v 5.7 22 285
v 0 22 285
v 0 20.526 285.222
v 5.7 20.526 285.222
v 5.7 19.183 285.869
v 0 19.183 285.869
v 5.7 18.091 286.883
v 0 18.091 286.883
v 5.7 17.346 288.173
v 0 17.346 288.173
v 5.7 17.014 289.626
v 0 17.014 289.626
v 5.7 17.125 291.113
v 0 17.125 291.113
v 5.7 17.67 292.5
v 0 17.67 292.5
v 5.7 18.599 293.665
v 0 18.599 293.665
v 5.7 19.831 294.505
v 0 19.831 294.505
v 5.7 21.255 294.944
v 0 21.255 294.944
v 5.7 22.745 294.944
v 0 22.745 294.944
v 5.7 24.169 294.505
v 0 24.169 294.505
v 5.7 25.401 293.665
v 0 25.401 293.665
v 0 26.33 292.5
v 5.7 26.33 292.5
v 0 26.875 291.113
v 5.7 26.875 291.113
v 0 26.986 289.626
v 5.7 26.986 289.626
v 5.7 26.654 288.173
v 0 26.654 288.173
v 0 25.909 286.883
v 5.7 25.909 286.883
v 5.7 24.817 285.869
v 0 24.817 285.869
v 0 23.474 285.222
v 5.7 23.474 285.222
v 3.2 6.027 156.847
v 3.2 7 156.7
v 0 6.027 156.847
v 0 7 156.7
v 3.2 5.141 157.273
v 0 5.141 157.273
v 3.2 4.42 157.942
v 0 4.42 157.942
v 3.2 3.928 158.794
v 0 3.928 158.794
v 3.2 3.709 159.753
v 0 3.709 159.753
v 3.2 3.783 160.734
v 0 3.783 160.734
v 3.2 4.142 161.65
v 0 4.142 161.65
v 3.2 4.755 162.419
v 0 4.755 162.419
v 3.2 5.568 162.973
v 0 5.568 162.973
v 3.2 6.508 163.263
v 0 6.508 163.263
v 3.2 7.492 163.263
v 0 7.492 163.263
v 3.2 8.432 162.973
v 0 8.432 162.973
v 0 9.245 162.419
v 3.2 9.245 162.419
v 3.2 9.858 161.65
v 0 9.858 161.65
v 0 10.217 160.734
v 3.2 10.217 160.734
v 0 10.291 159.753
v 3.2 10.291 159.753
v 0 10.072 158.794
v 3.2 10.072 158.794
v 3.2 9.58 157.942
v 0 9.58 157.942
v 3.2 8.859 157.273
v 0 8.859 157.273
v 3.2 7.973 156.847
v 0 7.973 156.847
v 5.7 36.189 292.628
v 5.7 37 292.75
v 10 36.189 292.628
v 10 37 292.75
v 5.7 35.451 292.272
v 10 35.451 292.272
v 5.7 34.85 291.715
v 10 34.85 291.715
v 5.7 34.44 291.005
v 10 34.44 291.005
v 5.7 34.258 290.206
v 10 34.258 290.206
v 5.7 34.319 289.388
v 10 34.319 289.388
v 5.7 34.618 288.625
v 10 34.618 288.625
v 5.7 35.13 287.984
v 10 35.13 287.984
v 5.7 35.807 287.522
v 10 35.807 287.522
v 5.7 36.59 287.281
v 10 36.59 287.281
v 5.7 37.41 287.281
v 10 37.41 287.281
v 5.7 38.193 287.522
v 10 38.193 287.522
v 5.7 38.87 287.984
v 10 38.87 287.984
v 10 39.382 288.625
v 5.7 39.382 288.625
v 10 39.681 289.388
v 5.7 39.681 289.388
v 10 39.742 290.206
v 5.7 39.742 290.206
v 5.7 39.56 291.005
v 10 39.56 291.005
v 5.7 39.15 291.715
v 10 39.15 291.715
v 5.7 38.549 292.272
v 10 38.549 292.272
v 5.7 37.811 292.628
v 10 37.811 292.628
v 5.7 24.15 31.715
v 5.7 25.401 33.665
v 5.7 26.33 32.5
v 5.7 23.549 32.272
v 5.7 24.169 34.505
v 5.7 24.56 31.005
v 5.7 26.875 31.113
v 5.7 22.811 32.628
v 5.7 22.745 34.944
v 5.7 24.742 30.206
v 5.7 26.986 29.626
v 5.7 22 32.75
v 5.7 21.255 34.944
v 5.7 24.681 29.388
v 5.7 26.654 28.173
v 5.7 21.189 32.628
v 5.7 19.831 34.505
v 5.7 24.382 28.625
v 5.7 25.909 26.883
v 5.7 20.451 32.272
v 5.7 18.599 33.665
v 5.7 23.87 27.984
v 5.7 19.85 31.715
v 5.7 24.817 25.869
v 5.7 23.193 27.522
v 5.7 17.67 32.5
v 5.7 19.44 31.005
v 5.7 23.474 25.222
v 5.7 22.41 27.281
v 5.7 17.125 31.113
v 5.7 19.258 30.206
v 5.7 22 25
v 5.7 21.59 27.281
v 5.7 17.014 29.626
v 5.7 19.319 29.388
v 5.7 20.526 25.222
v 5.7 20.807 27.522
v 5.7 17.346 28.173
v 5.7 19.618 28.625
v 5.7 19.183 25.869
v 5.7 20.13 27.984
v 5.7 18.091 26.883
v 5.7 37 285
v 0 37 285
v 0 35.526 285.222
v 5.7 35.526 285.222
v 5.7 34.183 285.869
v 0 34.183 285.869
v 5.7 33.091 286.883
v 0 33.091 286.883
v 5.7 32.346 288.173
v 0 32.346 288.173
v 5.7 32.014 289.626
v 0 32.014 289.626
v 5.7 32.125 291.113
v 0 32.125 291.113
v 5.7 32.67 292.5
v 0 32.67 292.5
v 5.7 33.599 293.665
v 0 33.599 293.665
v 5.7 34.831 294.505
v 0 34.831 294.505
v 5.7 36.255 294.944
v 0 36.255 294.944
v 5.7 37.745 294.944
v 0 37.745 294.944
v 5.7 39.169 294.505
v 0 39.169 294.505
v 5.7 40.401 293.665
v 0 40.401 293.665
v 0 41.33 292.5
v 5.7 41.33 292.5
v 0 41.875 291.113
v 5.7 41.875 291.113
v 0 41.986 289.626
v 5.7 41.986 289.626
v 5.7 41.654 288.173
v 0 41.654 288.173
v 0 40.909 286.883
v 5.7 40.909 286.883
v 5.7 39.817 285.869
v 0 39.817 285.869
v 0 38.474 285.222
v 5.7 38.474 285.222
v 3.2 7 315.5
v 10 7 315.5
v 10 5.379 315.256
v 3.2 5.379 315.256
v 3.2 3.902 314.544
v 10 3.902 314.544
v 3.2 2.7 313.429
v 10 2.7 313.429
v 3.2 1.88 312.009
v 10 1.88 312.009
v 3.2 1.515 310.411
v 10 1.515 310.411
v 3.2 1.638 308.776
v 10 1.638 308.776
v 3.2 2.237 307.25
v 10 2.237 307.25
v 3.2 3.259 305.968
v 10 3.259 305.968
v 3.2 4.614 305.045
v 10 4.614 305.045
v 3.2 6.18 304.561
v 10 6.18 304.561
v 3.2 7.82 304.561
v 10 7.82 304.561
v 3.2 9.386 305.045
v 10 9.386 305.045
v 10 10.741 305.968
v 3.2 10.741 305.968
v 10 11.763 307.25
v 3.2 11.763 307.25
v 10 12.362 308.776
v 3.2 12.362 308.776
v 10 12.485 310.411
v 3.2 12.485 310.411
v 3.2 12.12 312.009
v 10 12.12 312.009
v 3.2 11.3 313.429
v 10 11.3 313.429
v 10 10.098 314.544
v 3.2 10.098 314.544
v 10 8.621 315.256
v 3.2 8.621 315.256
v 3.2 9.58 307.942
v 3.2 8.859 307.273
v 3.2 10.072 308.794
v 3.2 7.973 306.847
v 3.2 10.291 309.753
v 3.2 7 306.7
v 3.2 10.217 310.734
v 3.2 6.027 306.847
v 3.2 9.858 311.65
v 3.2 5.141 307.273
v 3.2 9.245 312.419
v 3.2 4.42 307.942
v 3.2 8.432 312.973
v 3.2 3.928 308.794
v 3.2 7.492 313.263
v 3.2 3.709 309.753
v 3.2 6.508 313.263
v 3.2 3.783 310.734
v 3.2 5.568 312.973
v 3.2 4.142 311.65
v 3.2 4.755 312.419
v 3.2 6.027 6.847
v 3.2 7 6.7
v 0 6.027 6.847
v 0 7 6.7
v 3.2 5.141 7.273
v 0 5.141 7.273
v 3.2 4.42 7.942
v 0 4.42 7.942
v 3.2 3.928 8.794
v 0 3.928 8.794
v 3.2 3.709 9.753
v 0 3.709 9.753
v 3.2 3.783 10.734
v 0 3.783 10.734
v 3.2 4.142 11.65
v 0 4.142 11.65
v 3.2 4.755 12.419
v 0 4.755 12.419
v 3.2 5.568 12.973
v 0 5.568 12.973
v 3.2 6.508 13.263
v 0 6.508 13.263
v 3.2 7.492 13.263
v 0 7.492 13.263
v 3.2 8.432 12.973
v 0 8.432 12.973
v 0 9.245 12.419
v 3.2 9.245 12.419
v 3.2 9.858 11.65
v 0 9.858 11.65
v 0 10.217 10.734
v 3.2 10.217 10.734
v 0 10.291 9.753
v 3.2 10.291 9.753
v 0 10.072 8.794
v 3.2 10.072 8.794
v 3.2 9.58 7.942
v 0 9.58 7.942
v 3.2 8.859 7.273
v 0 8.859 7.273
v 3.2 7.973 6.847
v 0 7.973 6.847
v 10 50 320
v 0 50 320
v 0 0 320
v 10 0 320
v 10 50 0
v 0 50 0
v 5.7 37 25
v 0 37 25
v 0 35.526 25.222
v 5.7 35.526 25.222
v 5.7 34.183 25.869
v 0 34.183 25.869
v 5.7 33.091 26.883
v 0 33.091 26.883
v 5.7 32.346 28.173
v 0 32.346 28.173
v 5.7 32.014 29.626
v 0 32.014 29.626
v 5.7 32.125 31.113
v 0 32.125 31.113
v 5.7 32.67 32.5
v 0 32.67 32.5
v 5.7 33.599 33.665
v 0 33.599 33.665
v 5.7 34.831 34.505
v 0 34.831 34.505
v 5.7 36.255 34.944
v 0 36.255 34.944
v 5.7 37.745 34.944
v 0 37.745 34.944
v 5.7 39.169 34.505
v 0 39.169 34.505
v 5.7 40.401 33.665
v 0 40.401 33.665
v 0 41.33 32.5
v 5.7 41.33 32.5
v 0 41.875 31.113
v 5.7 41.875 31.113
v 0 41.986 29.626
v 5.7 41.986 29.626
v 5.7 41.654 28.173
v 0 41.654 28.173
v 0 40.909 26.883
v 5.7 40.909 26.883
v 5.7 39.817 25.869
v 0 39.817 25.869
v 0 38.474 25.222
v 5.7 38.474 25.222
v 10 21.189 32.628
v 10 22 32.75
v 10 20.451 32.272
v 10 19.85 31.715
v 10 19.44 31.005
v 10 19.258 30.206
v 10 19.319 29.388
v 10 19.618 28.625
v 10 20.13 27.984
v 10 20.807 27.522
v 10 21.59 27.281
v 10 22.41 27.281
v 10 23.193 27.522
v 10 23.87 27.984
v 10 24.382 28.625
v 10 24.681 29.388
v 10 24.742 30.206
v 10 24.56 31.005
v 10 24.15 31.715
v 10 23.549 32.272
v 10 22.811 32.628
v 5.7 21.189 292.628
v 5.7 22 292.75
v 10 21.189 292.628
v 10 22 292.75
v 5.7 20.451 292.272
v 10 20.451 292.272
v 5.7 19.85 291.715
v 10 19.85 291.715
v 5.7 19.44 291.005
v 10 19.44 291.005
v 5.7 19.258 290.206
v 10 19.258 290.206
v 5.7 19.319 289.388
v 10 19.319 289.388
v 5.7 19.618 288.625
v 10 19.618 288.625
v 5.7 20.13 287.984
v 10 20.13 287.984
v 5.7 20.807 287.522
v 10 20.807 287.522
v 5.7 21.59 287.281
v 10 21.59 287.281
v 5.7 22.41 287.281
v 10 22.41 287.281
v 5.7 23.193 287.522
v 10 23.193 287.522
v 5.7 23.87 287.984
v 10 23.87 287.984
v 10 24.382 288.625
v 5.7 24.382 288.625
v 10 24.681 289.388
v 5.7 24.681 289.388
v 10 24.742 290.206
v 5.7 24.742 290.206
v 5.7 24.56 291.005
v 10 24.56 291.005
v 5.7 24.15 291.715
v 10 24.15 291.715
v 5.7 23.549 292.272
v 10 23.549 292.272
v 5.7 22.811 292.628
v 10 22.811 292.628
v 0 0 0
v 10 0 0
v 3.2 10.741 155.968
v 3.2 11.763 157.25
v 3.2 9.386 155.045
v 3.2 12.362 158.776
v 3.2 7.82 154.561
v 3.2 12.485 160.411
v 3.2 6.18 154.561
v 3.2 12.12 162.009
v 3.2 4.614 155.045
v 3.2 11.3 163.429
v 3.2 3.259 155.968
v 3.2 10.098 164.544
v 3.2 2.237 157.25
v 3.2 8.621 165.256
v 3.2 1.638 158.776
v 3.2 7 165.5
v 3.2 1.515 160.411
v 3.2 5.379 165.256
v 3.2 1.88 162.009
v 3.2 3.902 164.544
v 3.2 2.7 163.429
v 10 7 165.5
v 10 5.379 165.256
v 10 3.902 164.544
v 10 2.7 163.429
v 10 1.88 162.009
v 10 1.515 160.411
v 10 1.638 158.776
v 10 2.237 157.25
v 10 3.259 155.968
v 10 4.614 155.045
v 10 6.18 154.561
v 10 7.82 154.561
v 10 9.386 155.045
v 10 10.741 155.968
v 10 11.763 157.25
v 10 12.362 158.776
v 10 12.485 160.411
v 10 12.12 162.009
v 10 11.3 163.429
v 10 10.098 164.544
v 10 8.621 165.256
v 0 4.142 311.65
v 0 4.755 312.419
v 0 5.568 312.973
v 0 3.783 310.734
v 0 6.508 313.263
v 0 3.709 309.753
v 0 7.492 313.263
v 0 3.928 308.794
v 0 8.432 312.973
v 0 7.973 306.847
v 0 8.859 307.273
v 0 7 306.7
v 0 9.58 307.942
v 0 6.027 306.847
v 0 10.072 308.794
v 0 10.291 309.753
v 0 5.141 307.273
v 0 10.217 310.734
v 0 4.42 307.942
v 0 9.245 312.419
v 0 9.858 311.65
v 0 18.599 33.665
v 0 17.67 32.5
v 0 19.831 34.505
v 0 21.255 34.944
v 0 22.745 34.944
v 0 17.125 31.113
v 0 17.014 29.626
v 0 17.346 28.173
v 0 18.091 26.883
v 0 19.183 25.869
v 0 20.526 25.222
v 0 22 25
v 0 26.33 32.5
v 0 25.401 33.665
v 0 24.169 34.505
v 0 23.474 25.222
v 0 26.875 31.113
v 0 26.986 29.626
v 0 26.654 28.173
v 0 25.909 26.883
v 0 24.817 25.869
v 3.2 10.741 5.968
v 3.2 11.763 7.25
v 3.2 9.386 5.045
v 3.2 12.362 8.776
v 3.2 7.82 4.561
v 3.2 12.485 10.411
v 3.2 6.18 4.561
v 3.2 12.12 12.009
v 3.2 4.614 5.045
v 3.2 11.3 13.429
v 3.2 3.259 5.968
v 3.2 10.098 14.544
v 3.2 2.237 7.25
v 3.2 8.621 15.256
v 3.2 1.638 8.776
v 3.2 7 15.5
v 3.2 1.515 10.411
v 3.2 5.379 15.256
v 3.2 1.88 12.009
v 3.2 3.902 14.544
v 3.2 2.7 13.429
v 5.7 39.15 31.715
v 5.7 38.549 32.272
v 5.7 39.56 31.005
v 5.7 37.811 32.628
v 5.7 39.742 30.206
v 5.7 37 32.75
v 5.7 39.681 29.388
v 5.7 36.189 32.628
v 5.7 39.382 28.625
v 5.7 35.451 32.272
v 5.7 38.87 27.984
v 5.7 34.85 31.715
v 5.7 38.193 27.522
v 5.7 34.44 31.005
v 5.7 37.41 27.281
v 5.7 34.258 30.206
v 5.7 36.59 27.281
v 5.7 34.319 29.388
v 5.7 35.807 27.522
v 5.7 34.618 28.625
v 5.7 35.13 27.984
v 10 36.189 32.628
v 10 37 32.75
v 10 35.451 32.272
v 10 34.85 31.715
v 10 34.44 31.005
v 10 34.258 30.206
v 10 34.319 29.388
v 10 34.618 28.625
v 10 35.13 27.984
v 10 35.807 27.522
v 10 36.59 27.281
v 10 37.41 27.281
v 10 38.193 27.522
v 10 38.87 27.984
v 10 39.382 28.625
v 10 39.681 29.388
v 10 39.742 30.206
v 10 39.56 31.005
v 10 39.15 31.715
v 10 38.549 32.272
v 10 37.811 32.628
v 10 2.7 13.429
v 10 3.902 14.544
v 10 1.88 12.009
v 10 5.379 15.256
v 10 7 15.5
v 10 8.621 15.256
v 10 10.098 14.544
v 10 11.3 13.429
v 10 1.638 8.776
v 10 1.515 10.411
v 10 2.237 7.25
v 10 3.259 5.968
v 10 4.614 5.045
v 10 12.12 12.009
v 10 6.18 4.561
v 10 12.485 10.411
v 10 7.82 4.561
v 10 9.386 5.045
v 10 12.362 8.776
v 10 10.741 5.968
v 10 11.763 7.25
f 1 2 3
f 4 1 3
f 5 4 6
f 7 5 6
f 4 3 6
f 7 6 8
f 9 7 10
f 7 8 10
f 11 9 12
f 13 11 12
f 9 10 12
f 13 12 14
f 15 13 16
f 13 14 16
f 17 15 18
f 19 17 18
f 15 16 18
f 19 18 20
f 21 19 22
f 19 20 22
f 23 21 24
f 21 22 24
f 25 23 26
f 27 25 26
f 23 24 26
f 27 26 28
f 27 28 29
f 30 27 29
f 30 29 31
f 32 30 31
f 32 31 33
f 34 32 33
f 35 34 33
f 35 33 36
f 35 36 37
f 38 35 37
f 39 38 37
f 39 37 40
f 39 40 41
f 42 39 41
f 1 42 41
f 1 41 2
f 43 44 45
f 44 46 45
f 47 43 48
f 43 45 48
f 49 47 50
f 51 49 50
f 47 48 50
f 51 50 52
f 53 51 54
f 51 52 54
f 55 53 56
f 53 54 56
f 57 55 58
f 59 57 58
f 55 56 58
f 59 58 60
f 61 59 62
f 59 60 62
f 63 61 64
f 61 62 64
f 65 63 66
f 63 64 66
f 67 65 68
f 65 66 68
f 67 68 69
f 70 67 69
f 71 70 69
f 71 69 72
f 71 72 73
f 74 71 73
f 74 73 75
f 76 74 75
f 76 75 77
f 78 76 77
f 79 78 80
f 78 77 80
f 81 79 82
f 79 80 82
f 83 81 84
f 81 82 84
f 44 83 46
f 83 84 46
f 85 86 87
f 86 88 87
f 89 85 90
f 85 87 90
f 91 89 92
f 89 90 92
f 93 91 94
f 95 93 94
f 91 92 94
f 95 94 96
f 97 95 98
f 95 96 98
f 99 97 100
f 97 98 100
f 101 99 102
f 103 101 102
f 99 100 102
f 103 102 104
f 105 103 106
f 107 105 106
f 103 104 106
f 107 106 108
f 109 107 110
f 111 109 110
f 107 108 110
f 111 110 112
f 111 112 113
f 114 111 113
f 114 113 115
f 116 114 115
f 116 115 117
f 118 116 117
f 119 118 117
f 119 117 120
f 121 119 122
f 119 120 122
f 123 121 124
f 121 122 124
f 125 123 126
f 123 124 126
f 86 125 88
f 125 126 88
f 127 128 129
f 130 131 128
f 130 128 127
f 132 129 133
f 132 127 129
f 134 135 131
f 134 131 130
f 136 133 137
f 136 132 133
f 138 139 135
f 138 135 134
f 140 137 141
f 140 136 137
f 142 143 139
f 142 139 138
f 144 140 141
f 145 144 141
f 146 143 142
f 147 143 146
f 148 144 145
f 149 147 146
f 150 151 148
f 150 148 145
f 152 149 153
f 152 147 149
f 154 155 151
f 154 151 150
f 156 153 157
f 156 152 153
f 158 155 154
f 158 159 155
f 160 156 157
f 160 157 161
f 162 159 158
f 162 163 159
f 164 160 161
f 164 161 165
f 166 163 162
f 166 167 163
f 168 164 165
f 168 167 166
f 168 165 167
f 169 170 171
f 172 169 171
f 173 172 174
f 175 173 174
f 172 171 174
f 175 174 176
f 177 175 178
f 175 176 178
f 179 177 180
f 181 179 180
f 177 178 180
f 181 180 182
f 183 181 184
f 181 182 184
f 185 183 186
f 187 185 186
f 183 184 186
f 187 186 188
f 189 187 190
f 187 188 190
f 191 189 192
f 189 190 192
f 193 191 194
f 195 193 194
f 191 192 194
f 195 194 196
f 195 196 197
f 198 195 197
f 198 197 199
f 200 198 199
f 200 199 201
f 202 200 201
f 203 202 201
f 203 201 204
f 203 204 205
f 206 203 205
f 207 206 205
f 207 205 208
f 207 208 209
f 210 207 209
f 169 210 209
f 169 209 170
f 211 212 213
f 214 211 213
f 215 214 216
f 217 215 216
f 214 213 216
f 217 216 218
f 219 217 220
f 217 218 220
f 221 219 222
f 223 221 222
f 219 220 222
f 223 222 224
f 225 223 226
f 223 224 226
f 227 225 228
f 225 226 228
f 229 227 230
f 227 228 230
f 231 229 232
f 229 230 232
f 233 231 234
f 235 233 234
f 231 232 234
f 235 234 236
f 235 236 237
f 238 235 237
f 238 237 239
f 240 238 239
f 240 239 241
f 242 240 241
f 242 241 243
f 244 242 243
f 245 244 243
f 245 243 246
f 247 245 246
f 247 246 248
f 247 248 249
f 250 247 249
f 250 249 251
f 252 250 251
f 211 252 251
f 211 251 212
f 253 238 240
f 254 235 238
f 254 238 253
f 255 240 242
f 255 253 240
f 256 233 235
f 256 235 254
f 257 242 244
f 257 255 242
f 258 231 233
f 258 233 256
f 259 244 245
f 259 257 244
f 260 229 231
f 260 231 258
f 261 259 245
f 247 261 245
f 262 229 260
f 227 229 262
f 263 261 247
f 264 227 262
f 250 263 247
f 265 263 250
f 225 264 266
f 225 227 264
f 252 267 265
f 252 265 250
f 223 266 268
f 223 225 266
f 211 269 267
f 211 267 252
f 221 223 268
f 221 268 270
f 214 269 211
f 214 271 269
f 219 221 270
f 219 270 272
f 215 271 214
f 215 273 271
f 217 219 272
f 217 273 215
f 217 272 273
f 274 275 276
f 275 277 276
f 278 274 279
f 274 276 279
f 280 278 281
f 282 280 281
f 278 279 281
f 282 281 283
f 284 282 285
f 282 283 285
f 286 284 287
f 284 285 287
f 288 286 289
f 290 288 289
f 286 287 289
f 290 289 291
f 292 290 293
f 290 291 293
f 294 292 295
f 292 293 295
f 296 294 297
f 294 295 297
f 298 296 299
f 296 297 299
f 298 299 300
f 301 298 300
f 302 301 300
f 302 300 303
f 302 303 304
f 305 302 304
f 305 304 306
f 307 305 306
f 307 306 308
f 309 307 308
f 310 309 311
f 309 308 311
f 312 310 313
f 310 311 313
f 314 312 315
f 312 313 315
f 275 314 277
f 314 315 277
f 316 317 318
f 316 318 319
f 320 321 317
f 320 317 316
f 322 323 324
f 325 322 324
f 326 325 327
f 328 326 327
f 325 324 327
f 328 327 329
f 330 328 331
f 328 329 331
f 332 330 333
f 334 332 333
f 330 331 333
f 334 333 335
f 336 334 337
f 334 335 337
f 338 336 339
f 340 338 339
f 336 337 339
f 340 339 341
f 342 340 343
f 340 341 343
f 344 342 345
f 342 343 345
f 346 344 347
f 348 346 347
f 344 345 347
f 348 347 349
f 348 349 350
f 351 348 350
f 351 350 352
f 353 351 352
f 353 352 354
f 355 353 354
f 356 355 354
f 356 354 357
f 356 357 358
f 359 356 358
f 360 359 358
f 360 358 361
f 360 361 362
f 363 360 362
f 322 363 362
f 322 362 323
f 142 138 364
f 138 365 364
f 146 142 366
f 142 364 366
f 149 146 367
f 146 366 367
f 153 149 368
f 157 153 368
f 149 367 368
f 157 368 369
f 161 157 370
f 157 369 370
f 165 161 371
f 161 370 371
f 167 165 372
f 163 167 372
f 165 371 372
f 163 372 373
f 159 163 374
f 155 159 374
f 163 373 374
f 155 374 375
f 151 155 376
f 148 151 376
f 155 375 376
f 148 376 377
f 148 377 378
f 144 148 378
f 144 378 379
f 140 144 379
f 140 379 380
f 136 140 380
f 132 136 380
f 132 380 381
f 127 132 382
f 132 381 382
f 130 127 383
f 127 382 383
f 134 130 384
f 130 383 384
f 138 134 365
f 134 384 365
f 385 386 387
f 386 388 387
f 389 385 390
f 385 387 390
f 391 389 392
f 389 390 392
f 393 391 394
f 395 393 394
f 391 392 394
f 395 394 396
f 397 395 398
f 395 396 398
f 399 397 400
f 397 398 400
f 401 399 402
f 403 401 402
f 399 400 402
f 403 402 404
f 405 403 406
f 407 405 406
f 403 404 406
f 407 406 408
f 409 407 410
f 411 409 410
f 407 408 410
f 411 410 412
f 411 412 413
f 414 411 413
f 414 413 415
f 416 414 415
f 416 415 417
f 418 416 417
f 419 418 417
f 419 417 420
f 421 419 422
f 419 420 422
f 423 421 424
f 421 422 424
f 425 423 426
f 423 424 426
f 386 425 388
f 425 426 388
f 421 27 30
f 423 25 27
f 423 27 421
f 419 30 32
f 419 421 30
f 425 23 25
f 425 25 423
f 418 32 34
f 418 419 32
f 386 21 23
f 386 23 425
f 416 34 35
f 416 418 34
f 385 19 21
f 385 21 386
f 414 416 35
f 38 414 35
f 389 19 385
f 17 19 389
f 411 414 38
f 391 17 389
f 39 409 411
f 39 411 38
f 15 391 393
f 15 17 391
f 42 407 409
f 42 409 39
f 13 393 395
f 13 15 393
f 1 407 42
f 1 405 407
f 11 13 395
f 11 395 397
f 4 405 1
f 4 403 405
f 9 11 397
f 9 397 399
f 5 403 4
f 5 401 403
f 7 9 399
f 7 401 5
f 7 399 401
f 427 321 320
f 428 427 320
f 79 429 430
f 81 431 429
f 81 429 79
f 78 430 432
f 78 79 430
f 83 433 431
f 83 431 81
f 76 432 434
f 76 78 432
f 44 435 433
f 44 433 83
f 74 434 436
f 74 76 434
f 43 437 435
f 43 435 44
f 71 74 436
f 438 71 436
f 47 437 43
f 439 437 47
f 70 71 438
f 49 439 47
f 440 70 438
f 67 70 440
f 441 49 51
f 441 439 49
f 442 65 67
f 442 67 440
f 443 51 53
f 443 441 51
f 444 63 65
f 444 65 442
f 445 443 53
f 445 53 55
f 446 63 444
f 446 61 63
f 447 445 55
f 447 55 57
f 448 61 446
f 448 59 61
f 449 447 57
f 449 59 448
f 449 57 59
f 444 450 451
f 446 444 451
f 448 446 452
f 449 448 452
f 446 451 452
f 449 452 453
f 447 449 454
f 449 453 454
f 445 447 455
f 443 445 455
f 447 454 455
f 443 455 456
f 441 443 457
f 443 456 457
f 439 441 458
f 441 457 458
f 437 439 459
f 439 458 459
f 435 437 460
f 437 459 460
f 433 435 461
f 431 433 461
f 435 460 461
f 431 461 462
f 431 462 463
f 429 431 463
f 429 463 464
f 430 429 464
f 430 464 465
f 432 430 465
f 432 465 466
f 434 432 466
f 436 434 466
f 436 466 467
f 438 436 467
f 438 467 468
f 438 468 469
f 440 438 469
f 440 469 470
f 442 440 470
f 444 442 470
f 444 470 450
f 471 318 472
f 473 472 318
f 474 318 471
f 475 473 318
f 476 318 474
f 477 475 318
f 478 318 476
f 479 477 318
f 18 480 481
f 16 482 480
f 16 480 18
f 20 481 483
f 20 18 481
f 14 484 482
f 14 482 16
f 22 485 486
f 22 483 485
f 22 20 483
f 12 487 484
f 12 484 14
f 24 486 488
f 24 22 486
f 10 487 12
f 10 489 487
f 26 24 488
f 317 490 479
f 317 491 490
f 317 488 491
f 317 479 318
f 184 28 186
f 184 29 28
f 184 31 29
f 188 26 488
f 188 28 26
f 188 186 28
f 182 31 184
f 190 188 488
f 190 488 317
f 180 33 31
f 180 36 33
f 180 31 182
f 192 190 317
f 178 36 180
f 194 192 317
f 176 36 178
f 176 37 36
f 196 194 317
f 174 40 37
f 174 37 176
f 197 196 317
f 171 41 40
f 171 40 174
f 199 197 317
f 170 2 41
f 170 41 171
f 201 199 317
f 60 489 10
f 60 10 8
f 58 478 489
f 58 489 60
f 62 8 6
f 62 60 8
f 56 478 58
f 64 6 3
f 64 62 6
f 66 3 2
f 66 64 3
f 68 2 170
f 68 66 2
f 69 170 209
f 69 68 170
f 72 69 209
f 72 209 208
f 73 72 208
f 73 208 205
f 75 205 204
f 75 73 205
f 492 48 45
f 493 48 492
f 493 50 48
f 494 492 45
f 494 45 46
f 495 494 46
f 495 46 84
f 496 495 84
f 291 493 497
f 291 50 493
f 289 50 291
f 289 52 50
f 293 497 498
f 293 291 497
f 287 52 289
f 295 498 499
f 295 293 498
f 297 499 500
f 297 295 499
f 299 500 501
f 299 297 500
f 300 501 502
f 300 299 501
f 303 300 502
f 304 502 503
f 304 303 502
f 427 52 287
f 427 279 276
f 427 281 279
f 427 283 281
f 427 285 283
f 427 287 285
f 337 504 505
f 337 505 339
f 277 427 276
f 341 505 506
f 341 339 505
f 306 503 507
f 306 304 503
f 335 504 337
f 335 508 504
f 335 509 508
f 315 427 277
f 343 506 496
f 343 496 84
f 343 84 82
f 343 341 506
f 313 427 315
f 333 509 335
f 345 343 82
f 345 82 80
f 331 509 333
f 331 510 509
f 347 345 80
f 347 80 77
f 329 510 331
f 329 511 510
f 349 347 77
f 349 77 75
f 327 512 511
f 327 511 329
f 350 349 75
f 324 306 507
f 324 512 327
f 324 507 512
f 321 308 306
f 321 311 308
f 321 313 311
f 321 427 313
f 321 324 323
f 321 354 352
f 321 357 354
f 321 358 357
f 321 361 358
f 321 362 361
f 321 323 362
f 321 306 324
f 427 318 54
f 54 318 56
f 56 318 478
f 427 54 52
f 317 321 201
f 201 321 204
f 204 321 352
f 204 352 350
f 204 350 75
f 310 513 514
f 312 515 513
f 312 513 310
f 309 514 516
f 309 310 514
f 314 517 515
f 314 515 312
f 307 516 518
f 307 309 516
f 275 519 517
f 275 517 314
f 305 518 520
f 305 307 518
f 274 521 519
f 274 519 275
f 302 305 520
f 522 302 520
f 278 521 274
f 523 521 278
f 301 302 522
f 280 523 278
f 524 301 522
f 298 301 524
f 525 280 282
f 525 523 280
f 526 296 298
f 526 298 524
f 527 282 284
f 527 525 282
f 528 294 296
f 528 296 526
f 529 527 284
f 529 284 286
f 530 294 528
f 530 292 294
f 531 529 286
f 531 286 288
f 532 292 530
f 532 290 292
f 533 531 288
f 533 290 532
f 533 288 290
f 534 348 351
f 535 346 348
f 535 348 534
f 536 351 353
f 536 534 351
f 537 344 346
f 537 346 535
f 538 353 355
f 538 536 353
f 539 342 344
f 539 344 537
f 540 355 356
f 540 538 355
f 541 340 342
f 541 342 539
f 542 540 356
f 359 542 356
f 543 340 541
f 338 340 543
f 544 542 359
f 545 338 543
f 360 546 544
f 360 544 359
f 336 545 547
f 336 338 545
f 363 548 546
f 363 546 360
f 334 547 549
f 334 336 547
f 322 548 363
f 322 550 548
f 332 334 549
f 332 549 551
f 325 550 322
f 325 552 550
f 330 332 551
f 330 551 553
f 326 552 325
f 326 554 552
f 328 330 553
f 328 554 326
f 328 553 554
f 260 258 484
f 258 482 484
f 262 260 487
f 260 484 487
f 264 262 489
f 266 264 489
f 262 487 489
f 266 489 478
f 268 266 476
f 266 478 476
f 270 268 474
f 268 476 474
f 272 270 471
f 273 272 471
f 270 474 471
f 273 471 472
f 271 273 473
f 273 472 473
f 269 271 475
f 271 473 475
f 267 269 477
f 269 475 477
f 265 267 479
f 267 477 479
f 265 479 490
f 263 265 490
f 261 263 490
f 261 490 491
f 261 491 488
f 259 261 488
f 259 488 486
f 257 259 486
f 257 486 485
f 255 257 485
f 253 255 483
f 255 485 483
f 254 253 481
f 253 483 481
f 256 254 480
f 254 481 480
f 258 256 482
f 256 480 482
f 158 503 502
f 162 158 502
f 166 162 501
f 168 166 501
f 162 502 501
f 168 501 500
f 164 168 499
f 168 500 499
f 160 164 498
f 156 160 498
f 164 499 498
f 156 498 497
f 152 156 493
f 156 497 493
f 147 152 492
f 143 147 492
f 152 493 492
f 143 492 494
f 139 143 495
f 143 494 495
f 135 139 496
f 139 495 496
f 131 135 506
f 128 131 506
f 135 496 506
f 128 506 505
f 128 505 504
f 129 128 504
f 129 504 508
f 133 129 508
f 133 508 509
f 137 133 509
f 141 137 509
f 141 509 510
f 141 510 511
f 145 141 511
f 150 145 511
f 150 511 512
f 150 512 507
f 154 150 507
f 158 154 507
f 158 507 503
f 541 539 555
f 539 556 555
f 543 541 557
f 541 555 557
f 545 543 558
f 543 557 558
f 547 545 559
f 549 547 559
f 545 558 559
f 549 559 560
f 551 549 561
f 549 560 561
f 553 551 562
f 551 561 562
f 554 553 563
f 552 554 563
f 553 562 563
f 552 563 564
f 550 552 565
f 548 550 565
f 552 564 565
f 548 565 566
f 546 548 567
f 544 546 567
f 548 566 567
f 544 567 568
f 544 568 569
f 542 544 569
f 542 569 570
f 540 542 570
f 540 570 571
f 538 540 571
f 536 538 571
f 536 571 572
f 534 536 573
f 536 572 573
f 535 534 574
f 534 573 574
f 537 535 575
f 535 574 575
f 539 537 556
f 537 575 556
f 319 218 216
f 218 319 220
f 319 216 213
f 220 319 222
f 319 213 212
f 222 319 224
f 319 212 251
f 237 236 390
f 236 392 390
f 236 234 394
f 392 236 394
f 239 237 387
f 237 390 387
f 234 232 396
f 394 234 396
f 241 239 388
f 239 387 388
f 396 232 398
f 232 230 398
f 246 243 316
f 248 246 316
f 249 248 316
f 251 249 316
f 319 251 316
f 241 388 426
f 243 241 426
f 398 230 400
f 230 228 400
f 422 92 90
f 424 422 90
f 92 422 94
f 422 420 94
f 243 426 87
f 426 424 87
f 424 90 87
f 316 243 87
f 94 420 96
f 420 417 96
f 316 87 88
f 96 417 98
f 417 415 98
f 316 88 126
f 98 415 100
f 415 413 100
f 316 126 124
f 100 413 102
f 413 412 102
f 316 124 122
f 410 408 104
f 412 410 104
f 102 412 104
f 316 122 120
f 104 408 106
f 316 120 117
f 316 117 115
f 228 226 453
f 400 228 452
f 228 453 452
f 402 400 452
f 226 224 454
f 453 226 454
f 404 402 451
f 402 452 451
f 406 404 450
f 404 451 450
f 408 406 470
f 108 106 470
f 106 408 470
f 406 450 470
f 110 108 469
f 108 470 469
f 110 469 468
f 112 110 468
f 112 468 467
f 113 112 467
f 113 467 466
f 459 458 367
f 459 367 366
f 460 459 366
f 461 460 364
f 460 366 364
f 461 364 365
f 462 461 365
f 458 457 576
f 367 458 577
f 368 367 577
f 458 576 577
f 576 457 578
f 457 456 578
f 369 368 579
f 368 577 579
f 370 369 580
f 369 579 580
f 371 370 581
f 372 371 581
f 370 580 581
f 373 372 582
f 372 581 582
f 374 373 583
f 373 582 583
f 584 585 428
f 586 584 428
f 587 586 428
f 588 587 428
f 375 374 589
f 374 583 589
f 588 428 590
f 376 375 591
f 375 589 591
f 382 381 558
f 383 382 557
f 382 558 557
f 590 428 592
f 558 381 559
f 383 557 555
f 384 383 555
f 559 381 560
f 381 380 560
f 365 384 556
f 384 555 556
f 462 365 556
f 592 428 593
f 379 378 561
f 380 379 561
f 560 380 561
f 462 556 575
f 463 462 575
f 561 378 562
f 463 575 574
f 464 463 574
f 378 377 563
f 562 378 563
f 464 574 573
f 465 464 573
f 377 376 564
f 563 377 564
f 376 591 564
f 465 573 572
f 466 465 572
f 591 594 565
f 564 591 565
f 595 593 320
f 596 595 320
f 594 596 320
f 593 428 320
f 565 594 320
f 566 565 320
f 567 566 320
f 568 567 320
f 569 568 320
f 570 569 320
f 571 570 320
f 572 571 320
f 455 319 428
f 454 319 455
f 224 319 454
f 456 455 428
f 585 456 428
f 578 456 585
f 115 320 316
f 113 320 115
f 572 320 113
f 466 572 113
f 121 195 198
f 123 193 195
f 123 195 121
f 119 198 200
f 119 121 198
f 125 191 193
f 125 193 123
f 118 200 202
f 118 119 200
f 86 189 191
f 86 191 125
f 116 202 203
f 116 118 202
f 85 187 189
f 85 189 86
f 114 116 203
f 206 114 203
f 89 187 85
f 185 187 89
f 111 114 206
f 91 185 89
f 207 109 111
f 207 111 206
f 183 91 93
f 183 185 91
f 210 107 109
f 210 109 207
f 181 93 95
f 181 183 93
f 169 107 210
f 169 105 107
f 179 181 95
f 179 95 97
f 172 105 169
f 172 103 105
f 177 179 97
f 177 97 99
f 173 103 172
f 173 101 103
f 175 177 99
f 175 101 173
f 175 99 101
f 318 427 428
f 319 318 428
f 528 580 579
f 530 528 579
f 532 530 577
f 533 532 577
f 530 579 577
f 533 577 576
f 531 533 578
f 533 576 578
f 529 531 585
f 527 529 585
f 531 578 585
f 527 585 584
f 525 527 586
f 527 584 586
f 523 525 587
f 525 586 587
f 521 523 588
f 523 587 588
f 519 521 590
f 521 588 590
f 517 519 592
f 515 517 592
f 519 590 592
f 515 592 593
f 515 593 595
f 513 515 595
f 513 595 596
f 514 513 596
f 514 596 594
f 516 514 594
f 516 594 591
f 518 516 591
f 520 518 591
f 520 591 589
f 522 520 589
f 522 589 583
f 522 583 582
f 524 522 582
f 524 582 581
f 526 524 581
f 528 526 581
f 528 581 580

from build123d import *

# Parameters (mm, degrees)
SKETCH_1_W                  = 10
SKETCH_1_H                  = 50
EXTRUDE_1_DEPTH             = 320
HOLE_WIZARD_2_D             = 6.6
HOLE_WIZARD_2_CBORE_D       = 11
HOLE_WIZARD_2_CBORE_DEPTH   = 6.8
HOLE_WIZARD_2_2_D           = 5.5
HOLE_WIZARD_2_2_CBORE_D     = 10
HOLE_WIZARD_2_2_CBORE_DEPTH = 5.7


with BuildPart() as part:
    # 草图1 → 凸台-拉伸1 (new body)
    with BuildSketch(Plane.XY):
        with Locations((5, 25)):
            Rectangle(SKETCH_1_W, SKETCH_1_H)
    extrude(amount=EXTRUDE_1_DEPTH)

    # Hole Wizard 2 (through all)
    with Locations(Plane(origin=(10, 7, 310), x_dir=(0, 0, 1), z_dir=(1, 0, 0))):
        with Locations((0, 0), (-150, 0), (-300, 0)):
            CounterBoreHole(HOLE_WIZARD_2_D / 2, HOLE_WIZARD_2_CBORE_D / 2, HOLE_WIZARD_2_CBORE_DEPTH)

    # Hole Wizard 2 2 (through all)
    with Locations(Plane(origin=(0, 37, 290), x_dir=(0, 0, -1), z_dir=(-1, 0, 0))):
        with Locations((0, 0), (0, 15), (260, 0), (260, 15)):
            CounterBoreHole(HOLE_WIZARD_2_2_D / 2, HOLE_WIZARD_2_2_CBORE_D / 2, HOLE_WIZARD_2_2_CBORE_DEPTH)


solid = part.part
